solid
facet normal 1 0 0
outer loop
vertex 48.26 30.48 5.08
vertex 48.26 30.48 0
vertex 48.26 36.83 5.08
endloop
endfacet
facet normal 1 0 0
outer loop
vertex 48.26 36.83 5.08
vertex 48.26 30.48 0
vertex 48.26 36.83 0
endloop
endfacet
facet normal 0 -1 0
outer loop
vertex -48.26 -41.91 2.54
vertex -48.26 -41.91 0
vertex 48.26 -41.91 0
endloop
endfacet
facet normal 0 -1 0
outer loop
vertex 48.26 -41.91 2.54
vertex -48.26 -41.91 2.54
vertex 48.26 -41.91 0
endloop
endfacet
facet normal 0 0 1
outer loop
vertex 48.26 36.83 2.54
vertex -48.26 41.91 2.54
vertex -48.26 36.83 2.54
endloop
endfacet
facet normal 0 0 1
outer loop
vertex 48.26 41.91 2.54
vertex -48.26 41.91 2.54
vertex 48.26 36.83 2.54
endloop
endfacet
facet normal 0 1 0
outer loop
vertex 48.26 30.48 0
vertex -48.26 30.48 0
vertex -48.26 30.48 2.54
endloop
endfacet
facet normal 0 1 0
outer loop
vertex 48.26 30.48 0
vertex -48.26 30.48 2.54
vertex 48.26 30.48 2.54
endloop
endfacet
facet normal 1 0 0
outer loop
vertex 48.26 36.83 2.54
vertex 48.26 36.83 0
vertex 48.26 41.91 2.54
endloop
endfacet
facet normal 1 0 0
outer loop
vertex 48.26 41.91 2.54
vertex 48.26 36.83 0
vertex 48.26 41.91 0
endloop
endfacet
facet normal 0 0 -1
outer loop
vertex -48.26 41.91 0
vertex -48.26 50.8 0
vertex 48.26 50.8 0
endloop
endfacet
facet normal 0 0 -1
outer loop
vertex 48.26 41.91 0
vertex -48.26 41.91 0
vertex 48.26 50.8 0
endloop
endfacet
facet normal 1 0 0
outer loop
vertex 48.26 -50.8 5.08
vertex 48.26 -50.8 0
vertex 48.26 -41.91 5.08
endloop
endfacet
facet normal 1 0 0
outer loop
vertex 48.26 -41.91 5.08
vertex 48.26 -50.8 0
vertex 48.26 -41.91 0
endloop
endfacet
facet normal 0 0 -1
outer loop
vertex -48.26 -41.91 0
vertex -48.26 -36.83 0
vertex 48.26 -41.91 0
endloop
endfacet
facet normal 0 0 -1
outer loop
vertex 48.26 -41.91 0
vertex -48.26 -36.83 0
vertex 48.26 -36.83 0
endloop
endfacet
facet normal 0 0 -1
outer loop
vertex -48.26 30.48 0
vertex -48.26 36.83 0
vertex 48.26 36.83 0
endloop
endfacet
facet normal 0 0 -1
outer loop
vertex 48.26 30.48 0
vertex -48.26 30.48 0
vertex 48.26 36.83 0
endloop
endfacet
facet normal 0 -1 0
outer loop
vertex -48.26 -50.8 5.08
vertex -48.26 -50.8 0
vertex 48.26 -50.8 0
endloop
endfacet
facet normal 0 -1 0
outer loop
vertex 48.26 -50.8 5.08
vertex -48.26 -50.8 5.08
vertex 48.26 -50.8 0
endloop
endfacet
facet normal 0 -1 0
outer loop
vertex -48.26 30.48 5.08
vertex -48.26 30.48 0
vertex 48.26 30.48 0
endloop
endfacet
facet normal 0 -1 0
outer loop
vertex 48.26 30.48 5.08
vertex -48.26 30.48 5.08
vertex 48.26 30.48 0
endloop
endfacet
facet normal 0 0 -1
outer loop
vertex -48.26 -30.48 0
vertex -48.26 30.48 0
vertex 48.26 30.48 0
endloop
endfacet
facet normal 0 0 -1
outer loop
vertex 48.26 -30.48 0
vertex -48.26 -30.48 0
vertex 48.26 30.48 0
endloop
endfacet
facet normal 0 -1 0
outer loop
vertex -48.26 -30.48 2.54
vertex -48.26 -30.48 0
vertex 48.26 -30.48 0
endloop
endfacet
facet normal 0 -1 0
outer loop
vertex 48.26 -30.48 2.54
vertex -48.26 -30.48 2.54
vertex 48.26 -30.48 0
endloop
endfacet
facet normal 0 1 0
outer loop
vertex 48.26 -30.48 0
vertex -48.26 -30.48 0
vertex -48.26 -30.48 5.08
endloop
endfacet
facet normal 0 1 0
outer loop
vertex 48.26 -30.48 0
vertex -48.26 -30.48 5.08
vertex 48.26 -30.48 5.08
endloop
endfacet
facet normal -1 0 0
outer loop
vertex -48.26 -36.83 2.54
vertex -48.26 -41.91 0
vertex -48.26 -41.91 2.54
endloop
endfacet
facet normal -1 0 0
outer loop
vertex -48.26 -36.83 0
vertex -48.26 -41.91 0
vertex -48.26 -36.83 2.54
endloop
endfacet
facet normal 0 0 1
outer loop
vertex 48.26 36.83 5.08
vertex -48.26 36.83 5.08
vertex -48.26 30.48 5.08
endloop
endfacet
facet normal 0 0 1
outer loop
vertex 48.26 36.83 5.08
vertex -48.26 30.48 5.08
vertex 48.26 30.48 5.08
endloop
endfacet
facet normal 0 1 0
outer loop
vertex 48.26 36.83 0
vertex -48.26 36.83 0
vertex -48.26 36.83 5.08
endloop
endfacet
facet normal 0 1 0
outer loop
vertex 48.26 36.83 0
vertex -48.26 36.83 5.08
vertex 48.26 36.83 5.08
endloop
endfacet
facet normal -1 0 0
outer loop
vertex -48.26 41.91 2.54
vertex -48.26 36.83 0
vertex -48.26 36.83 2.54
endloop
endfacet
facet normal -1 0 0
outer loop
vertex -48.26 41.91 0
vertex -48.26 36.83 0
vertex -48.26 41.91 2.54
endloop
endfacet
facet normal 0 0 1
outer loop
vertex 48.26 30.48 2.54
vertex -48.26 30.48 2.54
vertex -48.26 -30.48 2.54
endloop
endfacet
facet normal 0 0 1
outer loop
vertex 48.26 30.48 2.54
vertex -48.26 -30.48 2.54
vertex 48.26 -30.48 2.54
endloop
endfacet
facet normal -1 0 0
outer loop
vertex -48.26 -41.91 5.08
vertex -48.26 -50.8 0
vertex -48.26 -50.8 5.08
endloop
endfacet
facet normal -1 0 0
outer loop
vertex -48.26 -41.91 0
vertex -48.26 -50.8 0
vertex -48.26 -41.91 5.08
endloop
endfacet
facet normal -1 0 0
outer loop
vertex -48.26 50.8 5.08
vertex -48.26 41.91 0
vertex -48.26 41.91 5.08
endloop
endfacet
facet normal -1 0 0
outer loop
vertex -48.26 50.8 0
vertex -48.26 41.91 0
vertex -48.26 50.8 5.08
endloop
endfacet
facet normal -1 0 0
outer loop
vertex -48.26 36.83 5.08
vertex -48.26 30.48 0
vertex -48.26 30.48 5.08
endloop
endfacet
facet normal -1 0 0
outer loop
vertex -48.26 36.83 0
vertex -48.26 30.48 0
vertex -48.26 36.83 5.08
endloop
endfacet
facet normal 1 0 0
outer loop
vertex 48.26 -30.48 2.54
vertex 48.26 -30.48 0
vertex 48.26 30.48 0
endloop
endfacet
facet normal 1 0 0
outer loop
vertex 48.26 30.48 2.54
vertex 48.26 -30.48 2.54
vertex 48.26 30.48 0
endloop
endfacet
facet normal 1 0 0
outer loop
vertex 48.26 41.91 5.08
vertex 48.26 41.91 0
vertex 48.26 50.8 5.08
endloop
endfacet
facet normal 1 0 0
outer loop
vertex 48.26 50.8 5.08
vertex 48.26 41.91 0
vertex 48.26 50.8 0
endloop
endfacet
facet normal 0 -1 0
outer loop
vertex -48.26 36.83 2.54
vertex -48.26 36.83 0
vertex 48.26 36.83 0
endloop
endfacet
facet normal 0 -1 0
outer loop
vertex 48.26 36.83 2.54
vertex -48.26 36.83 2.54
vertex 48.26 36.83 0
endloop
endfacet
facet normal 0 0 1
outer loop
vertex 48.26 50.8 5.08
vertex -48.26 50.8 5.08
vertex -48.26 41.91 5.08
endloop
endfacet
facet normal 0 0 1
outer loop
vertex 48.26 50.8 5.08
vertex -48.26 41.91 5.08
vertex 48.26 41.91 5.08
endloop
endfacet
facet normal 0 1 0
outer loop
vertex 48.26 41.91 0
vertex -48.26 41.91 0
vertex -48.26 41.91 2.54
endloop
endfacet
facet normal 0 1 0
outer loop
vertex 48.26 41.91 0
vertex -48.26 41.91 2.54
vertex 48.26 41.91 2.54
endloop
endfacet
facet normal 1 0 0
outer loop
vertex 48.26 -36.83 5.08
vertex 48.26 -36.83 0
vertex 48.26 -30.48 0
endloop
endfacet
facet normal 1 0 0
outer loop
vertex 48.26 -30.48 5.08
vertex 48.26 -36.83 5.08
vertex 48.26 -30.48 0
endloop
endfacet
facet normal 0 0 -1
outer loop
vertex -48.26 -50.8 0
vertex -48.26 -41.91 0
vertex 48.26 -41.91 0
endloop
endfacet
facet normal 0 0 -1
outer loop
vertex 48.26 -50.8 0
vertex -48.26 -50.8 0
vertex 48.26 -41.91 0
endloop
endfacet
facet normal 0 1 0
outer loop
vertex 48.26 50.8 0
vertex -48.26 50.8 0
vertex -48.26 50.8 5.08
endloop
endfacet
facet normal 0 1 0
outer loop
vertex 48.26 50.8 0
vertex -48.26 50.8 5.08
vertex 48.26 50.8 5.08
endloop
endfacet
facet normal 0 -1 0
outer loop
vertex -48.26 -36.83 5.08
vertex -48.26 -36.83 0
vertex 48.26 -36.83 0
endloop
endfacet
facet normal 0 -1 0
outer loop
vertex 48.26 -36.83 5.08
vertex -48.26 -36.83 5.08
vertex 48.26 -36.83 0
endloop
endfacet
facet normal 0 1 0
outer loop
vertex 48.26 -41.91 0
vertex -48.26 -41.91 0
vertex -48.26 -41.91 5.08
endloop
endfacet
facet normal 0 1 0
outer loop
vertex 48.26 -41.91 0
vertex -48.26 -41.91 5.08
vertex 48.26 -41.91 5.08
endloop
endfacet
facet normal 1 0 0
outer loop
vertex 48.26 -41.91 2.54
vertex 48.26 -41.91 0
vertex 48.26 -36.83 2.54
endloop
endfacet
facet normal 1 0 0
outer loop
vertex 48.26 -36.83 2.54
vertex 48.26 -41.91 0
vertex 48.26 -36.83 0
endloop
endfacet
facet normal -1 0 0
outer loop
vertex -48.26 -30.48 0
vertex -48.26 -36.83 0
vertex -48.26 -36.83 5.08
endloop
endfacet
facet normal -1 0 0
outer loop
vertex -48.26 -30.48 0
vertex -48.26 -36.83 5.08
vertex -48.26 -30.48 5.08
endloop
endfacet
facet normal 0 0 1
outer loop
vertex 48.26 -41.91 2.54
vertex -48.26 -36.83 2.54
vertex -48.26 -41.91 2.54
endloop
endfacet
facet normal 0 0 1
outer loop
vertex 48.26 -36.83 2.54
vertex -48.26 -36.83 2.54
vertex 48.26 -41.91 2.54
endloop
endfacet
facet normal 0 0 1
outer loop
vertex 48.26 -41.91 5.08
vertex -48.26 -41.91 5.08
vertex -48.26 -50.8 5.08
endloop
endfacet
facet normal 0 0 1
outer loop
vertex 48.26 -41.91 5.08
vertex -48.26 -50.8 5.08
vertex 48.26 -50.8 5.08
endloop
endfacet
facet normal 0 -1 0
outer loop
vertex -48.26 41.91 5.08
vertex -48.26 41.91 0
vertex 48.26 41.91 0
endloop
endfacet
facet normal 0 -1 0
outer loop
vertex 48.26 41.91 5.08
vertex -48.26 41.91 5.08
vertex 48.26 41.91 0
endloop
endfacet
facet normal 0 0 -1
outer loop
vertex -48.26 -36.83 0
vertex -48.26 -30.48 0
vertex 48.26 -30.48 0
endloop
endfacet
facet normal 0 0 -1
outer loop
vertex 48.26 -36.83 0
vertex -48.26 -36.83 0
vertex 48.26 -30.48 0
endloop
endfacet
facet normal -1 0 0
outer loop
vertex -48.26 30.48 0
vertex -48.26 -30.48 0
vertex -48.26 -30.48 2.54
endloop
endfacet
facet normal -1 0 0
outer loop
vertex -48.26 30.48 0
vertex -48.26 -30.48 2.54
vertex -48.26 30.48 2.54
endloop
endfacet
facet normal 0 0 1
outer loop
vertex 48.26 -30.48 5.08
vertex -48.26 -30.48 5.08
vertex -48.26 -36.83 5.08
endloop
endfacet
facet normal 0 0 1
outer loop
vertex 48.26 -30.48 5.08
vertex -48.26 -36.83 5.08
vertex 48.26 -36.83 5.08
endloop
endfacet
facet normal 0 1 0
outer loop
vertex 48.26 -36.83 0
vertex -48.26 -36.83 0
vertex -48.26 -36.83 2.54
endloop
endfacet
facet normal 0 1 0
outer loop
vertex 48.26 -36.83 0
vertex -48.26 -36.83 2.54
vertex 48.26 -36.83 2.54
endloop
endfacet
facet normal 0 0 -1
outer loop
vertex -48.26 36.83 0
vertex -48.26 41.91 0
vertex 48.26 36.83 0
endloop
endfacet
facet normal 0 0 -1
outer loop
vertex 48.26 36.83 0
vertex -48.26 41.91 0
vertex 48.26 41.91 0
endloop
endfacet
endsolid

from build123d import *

# Parameters (mm, degrees)
F0_W     = 96.52
F0_H     = 8.89
F0_H_2   = 6.35
F1_DEPTH = 5.08
F0_H_3   = 5.08
F0_H_4   = 60.96
F2_DEPTH = 2.54


with BuildPart() as f1:
    # F0 (on Top) → F1 (new body)
    with BuildSketch(Plane.XY):
        with Locations((0, 46.355)):
            Rectangle(F0_W, F0_H)
        with Locations((0, 33.655)):
            Rectangle(F0_W, F0_H_2)
        with Locations((0, -46.355)):
            Rectangle(F0_W, F0_H)
        with Locations((0, -33.655)):
            Rectangle(F0_W, F0_H_2)
    extrude(amount=F1_DEPTH)


with BuildPart() as f2:
    # F0 (on Top) → F2 (new body)
    with BuildSketch(Plane.XY):
        with Locations((0, 39.37)):
            Rectangle(F0_W, F0_H_3)
        with Locations((0, -39.37)):
            Rectangle(F0_W, F0_H_3)
        Rectangle(F0_W, F0_H_4)
    extrude(amount=F2_DEPTH)


solid = Compound([f1.part, f2.part])
